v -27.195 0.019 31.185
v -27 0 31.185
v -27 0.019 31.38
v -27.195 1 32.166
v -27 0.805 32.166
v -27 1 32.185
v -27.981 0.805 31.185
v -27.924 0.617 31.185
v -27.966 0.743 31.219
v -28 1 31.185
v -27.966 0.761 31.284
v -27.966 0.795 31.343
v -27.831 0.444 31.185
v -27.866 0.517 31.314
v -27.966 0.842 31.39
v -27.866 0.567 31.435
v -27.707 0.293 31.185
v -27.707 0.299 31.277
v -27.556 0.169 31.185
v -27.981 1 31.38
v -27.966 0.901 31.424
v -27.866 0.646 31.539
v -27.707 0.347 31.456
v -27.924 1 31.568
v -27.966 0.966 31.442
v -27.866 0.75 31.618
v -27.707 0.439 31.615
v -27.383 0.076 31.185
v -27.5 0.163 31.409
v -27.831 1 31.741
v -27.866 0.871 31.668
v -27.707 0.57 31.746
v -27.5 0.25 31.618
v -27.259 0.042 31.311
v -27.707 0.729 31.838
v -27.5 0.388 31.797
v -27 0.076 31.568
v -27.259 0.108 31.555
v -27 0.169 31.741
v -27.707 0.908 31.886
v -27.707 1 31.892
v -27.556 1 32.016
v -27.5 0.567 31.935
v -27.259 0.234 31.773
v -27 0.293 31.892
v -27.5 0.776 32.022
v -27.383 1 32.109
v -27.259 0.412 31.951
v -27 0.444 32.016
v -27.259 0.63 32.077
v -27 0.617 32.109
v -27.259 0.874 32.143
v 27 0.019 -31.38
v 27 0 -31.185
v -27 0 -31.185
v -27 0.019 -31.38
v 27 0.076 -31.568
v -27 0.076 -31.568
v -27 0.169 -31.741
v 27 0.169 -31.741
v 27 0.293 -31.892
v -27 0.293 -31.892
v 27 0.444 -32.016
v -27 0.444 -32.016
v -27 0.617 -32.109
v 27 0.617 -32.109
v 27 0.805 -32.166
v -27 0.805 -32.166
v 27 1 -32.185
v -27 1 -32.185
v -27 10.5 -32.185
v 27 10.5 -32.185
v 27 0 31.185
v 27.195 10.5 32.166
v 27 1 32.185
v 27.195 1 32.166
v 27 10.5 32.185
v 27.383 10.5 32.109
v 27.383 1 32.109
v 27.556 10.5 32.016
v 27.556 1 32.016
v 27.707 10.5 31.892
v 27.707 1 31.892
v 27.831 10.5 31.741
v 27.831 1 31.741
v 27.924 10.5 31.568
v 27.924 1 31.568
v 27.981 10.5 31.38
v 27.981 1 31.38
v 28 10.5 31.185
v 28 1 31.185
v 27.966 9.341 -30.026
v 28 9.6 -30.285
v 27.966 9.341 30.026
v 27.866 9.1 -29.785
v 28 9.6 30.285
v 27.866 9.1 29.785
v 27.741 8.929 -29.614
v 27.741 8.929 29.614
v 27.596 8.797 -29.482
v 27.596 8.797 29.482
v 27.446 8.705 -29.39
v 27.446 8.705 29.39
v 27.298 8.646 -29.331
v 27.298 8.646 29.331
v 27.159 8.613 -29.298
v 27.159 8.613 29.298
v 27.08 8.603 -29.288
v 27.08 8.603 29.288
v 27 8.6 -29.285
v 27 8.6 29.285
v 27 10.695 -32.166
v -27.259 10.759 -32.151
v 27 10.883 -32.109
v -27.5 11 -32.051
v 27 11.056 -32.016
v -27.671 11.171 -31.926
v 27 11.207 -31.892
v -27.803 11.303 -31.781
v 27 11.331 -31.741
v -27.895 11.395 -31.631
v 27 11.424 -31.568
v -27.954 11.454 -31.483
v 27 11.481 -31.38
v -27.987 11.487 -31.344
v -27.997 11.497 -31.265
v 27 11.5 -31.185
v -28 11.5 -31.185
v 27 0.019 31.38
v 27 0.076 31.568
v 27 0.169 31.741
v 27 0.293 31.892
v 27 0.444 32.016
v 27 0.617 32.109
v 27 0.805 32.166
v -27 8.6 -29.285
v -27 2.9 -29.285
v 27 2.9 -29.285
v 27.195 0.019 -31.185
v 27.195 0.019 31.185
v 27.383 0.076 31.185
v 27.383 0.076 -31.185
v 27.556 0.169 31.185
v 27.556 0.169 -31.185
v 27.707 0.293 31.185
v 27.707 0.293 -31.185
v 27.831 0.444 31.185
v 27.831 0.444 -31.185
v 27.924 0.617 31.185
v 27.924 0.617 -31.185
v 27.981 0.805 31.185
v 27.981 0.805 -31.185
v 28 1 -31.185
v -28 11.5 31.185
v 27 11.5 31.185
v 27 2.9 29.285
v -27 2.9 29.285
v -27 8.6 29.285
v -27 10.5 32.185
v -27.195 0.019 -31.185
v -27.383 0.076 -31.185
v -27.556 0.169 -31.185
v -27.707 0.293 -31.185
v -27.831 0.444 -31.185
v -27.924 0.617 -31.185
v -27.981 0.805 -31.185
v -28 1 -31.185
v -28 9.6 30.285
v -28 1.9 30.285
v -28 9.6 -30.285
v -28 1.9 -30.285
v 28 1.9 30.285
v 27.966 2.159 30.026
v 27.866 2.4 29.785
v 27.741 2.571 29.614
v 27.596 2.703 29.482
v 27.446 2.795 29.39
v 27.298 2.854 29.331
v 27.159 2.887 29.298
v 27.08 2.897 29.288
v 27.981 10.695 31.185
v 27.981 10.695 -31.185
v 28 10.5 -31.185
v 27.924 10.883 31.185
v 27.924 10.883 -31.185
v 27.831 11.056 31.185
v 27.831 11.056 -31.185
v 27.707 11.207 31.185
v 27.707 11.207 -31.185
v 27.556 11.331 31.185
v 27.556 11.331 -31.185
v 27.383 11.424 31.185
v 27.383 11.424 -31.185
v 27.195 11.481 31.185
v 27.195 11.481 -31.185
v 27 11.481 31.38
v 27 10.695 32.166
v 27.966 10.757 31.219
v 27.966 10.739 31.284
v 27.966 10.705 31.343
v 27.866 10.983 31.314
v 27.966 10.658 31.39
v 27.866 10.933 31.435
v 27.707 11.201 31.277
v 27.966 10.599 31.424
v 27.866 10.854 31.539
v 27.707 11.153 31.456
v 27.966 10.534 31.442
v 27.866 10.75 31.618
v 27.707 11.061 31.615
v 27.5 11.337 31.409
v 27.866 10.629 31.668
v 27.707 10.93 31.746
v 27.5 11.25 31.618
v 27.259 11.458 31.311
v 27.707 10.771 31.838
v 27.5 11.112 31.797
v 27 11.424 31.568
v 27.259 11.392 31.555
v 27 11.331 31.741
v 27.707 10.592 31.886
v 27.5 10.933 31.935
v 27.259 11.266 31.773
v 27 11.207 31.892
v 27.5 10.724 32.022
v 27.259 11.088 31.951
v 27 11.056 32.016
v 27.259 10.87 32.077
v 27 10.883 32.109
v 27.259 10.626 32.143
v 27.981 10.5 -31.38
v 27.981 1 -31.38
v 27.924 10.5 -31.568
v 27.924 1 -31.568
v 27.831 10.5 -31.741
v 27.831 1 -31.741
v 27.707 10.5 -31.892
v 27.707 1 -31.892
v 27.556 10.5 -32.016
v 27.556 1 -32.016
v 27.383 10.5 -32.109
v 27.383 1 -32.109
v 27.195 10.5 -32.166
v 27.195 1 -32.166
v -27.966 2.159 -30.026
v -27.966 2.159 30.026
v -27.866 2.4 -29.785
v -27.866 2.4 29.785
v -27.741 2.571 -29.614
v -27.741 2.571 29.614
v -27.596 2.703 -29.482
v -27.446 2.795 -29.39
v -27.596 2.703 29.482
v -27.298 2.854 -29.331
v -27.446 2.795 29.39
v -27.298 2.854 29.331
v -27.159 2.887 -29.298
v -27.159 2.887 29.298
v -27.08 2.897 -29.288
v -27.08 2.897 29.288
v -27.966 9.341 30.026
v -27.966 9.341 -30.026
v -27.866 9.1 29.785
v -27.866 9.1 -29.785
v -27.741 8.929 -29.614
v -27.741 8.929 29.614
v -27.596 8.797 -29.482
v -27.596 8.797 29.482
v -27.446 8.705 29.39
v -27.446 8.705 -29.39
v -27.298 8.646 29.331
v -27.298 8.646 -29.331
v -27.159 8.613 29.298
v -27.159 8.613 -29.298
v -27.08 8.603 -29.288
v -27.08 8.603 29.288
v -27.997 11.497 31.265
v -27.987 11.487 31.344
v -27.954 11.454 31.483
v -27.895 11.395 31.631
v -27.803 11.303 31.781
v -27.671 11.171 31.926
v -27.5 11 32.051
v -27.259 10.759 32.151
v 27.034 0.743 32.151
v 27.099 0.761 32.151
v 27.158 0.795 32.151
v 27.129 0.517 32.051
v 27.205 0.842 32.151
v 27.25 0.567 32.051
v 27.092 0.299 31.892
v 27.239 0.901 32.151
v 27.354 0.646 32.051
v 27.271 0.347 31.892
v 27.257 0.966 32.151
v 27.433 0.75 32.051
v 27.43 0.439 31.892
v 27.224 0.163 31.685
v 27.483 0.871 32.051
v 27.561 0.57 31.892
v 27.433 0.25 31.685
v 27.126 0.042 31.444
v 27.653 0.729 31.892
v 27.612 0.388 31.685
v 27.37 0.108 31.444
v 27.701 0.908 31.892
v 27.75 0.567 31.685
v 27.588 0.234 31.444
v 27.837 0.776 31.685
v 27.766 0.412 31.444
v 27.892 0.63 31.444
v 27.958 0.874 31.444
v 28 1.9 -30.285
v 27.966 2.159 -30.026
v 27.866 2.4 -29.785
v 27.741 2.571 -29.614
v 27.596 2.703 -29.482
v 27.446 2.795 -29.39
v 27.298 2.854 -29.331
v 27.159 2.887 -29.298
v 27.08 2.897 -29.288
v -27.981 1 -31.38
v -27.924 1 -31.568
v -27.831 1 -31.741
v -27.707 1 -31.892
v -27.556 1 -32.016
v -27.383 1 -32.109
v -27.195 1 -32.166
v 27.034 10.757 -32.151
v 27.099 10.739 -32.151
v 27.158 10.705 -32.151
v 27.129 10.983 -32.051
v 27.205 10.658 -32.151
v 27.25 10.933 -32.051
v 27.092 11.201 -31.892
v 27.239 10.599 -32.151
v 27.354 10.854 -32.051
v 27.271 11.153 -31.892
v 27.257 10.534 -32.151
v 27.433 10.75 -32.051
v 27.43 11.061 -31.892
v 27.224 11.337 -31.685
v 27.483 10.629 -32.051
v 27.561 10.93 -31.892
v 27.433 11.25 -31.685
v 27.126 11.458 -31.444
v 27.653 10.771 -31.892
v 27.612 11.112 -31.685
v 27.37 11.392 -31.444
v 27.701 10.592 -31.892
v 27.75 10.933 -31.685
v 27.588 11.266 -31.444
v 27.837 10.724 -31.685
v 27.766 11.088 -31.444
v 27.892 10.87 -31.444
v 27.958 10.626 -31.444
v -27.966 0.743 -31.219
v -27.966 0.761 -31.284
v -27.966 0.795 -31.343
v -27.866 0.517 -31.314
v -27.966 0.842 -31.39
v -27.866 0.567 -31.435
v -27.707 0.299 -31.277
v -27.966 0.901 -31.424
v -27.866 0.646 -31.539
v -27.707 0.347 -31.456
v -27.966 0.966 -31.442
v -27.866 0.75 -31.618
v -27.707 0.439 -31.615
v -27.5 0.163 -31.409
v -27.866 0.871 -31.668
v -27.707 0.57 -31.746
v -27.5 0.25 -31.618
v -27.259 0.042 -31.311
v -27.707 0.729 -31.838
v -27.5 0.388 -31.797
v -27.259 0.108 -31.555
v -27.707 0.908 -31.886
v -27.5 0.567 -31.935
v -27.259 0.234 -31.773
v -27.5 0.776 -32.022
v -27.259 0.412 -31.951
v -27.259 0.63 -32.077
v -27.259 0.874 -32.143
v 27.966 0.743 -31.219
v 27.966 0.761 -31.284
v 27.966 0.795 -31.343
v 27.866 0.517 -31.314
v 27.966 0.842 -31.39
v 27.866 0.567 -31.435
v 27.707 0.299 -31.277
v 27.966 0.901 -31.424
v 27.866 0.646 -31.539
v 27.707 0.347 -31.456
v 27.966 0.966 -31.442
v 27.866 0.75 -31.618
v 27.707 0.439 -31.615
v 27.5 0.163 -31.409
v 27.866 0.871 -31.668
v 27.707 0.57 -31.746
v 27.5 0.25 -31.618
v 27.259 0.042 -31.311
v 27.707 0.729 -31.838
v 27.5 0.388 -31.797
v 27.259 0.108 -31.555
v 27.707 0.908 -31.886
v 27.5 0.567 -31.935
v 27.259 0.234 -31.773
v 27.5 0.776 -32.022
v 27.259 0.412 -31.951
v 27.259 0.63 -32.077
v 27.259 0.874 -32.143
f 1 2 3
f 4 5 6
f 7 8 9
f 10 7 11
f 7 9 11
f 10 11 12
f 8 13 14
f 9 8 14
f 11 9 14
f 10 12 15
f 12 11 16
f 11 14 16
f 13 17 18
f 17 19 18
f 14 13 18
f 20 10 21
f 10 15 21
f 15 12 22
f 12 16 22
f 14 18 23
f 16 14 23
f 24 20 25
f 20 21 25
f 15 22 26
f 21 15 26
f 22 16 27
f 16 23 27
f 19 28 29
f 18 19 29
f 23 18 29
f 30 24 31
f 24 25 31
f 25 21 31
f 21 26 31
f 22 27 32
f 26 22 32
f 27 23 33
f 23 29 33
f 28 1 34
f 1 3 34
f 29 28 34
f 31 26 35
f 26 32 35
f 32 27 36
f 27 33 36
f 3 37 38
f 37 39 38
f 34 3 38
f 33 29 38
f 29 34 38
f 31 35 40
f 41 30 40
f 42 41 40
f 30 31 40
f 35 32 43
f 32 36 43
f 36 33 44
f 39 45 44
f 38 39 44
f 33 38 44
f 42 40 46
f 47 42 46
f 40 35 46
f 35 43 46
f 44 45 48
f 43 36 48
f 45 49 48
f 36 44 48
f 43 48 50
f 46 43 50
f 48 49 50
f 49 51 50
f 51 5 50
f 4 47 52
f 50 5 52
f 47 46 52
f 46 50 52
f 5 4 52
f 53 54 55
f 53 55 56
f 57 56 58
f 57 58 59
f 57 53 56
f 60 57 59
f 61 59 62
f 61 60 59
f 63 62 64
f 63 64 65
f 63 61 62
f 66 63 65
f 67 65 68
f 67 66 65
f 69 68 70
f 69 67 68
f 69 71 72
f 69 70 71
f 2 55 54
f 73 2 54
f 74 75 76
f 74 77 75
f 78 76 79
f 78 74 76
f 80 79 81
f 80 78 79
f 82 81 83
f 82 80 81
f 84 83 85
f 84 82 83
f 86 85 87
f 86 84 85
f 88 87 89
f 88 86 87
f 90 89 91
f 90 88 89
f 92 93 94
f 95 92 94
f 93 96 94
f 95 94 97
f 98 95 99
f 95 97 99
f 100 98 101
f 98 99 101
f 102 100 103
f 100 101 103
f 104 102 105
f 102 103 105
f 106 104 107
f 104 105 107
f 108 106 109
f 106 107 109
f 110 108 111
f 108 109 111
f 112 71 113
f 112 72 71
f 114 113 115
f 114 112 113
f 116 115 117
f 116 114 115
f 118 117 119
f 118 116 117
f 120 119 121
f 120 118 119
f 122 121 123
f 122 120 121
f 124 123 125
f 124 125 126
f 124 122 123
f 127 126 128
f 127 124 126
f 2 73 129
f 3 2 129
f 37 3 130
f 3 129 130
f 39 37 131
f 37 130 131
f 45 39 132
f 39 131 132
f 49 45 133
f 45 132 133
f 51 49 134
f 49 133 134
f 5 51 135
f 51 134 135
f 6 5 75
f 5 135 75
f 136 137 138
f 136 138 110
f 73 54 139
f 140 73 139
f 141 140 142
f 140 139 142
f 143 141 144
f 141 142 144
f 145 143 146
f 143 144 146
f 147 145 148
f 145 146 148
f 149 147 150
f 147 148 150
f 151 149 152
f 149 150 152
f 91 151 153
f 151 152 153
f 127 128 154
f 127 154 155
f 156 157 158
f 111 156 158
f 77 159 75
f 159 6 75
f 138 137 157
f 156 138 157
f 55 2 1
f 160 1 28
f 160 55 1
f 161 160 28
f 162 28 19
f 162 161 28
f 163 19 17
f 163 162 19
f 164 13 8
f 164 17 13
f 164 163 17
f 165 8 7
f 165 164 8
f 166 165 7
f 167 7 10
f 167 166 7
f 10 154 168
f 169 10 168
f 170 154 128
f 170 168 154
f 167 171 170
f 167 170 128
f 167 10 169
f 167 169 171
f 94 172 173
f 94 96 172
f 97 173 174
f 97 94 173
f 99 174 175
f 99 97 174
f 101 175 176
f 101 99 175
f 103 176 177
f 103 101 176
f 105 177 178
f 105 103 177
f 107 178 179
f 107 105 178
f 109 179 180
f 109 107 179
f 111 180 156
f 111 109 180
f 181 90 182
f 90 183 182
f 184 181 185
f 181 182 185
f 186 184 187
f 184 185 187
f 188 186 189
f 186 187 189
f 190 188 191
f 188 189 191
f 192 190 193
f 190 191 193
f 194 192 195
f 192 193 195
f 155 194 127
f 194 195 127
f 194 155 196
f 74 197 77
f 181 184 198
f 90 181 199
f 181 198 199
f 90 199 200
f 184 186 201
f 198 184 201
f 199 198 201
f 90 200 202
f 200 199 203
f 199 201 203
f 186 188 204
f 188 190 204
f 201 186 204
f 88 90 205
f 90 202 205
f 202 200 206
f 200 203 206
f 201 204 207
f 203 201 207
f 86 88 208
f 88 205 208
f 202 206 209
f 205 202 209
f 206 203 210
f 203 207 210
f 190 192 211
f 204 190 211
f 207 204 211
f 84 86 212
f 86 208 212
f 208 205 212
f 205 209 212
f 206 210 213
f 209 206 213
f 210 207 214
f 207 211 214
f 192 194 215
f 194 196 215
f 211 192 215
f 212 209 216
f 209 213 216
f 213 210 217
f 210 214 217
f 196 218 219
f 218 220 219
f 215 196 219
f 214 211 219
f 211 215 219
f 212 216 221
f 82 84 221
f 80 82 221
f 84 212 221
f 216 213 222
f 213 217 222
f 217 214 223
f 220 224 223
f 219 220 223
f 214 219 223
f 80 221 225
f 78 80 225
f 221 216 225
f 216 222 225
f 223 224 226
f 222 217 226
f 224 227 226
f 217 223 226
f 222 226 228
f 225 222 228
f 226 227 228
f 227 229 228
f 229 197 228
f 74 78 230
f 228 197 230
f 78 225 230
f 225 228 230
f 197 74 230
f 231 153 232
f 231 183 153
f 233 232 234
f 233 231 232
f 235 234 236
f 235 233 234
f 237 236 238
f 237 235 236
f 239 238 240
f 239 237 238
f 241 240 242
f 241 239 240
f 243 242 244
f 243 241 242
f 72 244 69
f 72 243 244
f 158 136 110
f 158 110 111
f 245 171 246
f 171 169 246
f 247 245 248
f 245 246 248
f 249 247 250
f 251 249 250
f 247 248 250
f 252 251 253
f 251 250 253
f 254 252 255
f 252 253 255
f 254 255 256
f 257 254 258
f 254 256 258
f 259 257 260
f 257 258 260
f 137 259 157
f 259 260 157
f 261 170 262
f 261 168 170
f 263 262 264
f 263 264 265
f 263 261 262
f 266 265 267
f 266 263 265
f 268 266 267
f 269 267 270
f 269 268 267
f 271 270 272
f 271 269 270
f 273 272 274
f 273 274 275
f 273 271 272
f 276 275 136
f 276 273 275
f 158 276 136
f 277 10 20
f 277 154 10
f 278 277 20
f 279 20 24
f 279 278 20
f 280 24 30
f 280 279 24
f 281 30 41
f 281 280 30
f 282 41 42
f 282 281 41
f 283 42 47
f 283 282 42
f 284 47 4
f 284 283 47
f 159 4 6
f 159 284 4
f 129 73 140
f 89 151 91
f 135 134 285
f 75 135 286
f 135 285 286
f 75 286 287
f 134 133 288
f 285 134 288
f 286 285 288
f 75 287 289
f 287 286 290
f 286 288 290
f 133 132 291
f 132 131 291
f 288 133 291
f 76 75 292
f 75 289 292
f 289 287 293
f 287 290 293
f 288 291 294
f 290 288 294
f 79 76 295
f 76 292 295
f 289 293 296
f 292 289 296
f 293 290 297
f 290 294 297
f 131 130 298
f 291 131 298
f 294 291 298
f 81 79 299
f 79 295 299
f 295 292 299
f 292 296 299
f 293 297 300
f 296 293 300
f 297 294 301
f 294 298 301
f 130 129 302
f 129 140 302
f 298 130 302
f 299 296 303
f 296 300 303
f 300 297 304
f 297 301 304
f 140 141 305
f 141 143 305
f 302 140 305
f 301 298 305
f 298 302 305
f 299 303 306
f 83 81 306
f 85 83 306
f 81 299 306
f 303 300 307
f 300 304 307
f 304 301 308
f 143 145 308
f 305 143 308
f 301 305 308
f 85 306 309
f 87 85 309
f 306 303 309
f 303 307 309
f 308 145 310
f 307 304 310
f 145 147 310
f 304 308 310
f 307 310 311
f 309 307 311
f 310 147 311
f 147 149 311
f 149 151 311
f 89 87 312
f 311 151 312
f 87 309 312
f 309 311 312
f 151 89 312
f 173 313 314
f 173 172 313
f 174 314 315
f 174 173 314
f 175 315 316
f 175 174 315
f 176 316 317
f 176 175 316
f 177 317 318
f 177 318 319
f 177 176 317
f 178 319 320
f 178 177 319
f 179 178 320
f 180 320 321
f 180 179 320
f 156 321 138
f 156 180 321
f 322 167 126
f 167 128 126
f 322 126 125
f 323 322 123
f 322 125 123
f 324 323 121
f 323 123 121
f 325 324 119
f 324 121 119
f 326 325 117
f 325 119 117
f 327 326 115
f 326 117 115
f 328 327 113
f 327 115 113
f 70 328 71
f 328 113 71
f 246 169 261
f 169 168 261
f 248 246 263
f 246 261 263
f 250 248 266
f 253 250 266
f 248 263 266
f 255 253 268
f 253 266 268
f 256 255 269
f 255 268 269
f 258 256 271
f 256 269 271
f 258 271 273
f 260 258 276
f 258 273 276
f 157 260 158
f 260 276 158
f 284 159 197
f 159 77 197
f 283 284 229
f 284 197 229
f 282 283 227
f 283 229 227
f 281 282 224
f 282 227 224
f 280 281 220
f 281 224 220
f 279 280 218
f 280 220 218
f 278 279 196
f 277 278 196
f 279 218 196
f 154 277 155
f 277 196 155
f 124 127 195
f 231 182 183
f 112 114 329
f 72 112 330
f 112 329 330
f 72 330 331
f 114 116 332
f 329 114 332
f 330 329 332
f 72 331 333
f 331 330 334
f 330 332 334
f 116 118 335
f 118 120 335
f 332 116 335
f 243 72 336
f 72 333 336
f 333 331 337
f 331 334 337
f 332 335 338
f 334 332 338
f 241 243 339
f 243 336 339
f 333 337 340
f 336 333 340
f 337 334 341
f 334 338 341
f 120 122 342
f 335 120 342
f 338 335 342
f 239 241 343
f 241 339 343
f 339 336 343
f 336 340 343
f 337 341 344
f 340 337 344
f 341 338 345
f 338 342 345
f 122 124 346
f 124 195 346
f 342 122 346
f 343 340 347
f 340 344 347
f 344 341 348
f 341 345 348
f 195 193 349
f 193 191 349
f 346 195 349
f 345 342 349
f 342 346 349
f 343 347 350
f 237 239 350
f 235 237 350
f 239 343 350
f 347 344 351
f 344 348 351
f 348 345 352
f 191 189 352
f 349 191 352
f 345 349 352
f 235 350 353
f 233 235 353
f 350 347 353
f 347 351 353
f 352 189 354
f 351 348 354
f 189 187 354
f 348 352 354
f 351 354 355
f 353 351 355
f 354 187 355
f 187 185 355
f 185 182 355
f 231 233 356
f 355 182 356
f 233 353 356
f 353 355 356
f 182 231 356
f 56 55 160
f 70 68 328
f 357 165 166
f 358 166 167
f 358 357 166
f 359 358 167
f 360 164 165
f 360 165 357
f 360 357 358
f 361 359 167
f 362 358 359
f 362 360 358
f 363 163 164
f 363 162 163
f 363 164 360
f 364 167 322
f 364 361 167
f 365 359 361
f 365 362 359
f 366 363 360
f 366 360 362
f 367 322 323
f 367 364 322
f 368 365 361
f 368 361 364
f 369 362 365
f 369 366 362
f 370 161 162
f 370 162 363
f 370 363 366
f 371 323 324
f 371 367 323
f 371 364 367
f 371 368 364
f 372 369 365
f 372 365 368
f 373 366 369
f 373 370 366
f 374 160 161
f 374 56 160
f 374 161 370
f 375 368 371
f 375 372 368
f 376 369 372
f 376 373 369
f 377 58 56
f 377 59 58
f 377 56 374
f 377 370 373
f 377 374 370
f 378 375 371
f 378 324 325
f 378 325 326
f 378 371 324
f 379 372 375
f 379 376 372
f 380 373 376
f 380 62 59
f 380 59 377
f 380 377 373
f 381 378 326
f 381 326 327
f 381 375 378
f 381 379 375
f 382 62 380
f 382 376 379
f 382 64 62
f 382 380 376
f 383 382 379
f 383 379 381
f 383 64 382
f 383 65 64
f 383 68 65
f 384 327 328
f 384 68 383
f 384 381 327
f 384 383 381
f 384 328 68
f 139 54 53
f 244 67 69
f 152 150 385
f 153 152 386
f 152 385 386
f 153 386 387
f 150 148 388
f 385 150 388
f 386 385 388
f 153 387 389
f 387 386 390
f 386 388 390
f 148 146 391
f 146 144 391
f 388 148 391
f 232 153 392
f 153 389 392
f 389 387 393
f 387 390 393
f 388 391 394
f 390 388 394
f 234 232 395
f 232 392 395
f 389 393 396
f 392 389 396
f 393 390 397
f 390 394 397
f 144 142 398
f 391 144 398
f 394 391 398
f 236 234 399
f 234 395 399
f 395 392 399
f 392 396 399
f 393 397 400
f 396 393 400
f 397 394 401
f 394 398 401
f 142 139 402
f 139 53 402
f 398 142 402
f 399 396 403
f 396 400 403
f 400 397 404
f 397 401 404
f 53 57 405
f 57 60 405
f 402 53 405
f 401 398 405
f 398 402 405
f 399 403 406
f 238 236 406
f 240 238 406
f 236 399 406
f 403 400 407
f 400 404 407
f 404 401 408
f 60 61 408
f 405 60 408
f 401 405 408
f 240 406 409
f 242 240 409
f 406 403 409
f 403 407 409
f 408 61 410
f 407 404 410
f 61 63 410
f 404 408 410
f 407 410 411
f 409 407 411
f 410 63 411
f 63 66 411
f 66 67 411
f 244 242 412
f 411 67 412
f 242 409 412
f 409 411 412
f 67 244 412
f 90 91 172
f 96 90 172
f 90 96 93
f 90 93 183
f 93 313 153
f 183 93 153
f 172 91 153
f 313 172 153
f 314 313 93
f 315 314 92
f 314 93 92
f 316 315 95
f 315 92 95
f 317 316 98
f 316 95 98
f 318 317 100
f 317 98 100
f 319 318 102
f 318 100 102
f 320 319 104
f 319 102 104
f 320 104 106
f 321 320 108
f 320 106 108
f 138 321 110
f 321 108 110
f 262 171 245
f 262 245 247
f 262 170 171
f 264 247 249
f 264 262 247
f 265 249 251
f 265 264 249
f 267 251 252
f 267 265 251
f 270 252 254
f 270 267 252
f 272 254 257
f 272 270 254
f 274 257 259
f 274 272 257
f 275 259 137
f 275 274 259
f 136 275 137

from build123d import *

# Parameters (mm, degrees)
SKETCH1_W           = 56
SKETCH1_H           = 64.37
SKETCH1_W_2         = 50
SKETCH1_H_2         = 58.37
BOSS_EXTRUDE1_DEPTH = 11.5
SKETCH2_W           = 58.57
SKETCH2_H           = 5.7
CUT_EXTRUDE1_DEPTH  = 103
FILLET1_R           = 1


with BuildPart() as part:
    # Sketch1 → Boss-Extrude1 (new body)
    # profile 1 of 2: a face of its own
    with BuildSketch(Plane(origin=(0, 0, 0), x_dir=(1, 0, 0), z_dir=(0, 1, 0))):
        Rectangle(SKETCH1_W, SKETCH1_H)
        Rectangle(SKETCH1_W_2, SKETCH1_H_2, mode=Mode.SUBTRACT)
    # profile 2 of 2: a face of its own
    with BuildSketch(Plane(origin=(0, 0, 0), x_dir=(1, 0, 0), z_dir=(0, 1, 0))):
        Rectangle(SKETCH1_W_2, SKETCH1_H_2)
    extrude(amount=BOSS_EXTRUDE1_DEPTH)

    # Sketch2 → Cut-Extrude1 (cut)
    with BuildSketch(Plane.ZY.offset(28)):
        with Locations((0, 5.75)):
            Rectangle(SKETCH2_W, SKETCH2_H)
    extrude(amount=-CUT_EXTRUDE1_DEPTH, mode=Mode.SUBTRACT)

    # Fillet1
    fillet1_edges = [part.edges().sort_by_distance(p)[0] for p in [
        (0, 11.5, 32.185),
        (28, 11.5, 0),
        (0, 11.5, -32.185),
        (28, 2.9, 0),
        (-28, 5.75, -29.285),
        (-28, 8.6, 0),
        (28, 5.75, 29.285),
        (28, 5.75, -29.285),
        (28, 8.6, 0),
        (-28, 2.9, 0),
        (-28, 5.75, 29.285),
        (0, 0, -32.185),
        (28, 0, 0),
        (0, 0, 32.185),
        (-28, 0, 0),
        (-28, 5.75, -32.185),
        (28, 5.75, -32.185),
        (28, 5.75, 32.185),
        (-28, 5.75, 32.185),
    ]]
    fillet(fillet1_edges, radius=FILLET1_R)


solid = part.part
